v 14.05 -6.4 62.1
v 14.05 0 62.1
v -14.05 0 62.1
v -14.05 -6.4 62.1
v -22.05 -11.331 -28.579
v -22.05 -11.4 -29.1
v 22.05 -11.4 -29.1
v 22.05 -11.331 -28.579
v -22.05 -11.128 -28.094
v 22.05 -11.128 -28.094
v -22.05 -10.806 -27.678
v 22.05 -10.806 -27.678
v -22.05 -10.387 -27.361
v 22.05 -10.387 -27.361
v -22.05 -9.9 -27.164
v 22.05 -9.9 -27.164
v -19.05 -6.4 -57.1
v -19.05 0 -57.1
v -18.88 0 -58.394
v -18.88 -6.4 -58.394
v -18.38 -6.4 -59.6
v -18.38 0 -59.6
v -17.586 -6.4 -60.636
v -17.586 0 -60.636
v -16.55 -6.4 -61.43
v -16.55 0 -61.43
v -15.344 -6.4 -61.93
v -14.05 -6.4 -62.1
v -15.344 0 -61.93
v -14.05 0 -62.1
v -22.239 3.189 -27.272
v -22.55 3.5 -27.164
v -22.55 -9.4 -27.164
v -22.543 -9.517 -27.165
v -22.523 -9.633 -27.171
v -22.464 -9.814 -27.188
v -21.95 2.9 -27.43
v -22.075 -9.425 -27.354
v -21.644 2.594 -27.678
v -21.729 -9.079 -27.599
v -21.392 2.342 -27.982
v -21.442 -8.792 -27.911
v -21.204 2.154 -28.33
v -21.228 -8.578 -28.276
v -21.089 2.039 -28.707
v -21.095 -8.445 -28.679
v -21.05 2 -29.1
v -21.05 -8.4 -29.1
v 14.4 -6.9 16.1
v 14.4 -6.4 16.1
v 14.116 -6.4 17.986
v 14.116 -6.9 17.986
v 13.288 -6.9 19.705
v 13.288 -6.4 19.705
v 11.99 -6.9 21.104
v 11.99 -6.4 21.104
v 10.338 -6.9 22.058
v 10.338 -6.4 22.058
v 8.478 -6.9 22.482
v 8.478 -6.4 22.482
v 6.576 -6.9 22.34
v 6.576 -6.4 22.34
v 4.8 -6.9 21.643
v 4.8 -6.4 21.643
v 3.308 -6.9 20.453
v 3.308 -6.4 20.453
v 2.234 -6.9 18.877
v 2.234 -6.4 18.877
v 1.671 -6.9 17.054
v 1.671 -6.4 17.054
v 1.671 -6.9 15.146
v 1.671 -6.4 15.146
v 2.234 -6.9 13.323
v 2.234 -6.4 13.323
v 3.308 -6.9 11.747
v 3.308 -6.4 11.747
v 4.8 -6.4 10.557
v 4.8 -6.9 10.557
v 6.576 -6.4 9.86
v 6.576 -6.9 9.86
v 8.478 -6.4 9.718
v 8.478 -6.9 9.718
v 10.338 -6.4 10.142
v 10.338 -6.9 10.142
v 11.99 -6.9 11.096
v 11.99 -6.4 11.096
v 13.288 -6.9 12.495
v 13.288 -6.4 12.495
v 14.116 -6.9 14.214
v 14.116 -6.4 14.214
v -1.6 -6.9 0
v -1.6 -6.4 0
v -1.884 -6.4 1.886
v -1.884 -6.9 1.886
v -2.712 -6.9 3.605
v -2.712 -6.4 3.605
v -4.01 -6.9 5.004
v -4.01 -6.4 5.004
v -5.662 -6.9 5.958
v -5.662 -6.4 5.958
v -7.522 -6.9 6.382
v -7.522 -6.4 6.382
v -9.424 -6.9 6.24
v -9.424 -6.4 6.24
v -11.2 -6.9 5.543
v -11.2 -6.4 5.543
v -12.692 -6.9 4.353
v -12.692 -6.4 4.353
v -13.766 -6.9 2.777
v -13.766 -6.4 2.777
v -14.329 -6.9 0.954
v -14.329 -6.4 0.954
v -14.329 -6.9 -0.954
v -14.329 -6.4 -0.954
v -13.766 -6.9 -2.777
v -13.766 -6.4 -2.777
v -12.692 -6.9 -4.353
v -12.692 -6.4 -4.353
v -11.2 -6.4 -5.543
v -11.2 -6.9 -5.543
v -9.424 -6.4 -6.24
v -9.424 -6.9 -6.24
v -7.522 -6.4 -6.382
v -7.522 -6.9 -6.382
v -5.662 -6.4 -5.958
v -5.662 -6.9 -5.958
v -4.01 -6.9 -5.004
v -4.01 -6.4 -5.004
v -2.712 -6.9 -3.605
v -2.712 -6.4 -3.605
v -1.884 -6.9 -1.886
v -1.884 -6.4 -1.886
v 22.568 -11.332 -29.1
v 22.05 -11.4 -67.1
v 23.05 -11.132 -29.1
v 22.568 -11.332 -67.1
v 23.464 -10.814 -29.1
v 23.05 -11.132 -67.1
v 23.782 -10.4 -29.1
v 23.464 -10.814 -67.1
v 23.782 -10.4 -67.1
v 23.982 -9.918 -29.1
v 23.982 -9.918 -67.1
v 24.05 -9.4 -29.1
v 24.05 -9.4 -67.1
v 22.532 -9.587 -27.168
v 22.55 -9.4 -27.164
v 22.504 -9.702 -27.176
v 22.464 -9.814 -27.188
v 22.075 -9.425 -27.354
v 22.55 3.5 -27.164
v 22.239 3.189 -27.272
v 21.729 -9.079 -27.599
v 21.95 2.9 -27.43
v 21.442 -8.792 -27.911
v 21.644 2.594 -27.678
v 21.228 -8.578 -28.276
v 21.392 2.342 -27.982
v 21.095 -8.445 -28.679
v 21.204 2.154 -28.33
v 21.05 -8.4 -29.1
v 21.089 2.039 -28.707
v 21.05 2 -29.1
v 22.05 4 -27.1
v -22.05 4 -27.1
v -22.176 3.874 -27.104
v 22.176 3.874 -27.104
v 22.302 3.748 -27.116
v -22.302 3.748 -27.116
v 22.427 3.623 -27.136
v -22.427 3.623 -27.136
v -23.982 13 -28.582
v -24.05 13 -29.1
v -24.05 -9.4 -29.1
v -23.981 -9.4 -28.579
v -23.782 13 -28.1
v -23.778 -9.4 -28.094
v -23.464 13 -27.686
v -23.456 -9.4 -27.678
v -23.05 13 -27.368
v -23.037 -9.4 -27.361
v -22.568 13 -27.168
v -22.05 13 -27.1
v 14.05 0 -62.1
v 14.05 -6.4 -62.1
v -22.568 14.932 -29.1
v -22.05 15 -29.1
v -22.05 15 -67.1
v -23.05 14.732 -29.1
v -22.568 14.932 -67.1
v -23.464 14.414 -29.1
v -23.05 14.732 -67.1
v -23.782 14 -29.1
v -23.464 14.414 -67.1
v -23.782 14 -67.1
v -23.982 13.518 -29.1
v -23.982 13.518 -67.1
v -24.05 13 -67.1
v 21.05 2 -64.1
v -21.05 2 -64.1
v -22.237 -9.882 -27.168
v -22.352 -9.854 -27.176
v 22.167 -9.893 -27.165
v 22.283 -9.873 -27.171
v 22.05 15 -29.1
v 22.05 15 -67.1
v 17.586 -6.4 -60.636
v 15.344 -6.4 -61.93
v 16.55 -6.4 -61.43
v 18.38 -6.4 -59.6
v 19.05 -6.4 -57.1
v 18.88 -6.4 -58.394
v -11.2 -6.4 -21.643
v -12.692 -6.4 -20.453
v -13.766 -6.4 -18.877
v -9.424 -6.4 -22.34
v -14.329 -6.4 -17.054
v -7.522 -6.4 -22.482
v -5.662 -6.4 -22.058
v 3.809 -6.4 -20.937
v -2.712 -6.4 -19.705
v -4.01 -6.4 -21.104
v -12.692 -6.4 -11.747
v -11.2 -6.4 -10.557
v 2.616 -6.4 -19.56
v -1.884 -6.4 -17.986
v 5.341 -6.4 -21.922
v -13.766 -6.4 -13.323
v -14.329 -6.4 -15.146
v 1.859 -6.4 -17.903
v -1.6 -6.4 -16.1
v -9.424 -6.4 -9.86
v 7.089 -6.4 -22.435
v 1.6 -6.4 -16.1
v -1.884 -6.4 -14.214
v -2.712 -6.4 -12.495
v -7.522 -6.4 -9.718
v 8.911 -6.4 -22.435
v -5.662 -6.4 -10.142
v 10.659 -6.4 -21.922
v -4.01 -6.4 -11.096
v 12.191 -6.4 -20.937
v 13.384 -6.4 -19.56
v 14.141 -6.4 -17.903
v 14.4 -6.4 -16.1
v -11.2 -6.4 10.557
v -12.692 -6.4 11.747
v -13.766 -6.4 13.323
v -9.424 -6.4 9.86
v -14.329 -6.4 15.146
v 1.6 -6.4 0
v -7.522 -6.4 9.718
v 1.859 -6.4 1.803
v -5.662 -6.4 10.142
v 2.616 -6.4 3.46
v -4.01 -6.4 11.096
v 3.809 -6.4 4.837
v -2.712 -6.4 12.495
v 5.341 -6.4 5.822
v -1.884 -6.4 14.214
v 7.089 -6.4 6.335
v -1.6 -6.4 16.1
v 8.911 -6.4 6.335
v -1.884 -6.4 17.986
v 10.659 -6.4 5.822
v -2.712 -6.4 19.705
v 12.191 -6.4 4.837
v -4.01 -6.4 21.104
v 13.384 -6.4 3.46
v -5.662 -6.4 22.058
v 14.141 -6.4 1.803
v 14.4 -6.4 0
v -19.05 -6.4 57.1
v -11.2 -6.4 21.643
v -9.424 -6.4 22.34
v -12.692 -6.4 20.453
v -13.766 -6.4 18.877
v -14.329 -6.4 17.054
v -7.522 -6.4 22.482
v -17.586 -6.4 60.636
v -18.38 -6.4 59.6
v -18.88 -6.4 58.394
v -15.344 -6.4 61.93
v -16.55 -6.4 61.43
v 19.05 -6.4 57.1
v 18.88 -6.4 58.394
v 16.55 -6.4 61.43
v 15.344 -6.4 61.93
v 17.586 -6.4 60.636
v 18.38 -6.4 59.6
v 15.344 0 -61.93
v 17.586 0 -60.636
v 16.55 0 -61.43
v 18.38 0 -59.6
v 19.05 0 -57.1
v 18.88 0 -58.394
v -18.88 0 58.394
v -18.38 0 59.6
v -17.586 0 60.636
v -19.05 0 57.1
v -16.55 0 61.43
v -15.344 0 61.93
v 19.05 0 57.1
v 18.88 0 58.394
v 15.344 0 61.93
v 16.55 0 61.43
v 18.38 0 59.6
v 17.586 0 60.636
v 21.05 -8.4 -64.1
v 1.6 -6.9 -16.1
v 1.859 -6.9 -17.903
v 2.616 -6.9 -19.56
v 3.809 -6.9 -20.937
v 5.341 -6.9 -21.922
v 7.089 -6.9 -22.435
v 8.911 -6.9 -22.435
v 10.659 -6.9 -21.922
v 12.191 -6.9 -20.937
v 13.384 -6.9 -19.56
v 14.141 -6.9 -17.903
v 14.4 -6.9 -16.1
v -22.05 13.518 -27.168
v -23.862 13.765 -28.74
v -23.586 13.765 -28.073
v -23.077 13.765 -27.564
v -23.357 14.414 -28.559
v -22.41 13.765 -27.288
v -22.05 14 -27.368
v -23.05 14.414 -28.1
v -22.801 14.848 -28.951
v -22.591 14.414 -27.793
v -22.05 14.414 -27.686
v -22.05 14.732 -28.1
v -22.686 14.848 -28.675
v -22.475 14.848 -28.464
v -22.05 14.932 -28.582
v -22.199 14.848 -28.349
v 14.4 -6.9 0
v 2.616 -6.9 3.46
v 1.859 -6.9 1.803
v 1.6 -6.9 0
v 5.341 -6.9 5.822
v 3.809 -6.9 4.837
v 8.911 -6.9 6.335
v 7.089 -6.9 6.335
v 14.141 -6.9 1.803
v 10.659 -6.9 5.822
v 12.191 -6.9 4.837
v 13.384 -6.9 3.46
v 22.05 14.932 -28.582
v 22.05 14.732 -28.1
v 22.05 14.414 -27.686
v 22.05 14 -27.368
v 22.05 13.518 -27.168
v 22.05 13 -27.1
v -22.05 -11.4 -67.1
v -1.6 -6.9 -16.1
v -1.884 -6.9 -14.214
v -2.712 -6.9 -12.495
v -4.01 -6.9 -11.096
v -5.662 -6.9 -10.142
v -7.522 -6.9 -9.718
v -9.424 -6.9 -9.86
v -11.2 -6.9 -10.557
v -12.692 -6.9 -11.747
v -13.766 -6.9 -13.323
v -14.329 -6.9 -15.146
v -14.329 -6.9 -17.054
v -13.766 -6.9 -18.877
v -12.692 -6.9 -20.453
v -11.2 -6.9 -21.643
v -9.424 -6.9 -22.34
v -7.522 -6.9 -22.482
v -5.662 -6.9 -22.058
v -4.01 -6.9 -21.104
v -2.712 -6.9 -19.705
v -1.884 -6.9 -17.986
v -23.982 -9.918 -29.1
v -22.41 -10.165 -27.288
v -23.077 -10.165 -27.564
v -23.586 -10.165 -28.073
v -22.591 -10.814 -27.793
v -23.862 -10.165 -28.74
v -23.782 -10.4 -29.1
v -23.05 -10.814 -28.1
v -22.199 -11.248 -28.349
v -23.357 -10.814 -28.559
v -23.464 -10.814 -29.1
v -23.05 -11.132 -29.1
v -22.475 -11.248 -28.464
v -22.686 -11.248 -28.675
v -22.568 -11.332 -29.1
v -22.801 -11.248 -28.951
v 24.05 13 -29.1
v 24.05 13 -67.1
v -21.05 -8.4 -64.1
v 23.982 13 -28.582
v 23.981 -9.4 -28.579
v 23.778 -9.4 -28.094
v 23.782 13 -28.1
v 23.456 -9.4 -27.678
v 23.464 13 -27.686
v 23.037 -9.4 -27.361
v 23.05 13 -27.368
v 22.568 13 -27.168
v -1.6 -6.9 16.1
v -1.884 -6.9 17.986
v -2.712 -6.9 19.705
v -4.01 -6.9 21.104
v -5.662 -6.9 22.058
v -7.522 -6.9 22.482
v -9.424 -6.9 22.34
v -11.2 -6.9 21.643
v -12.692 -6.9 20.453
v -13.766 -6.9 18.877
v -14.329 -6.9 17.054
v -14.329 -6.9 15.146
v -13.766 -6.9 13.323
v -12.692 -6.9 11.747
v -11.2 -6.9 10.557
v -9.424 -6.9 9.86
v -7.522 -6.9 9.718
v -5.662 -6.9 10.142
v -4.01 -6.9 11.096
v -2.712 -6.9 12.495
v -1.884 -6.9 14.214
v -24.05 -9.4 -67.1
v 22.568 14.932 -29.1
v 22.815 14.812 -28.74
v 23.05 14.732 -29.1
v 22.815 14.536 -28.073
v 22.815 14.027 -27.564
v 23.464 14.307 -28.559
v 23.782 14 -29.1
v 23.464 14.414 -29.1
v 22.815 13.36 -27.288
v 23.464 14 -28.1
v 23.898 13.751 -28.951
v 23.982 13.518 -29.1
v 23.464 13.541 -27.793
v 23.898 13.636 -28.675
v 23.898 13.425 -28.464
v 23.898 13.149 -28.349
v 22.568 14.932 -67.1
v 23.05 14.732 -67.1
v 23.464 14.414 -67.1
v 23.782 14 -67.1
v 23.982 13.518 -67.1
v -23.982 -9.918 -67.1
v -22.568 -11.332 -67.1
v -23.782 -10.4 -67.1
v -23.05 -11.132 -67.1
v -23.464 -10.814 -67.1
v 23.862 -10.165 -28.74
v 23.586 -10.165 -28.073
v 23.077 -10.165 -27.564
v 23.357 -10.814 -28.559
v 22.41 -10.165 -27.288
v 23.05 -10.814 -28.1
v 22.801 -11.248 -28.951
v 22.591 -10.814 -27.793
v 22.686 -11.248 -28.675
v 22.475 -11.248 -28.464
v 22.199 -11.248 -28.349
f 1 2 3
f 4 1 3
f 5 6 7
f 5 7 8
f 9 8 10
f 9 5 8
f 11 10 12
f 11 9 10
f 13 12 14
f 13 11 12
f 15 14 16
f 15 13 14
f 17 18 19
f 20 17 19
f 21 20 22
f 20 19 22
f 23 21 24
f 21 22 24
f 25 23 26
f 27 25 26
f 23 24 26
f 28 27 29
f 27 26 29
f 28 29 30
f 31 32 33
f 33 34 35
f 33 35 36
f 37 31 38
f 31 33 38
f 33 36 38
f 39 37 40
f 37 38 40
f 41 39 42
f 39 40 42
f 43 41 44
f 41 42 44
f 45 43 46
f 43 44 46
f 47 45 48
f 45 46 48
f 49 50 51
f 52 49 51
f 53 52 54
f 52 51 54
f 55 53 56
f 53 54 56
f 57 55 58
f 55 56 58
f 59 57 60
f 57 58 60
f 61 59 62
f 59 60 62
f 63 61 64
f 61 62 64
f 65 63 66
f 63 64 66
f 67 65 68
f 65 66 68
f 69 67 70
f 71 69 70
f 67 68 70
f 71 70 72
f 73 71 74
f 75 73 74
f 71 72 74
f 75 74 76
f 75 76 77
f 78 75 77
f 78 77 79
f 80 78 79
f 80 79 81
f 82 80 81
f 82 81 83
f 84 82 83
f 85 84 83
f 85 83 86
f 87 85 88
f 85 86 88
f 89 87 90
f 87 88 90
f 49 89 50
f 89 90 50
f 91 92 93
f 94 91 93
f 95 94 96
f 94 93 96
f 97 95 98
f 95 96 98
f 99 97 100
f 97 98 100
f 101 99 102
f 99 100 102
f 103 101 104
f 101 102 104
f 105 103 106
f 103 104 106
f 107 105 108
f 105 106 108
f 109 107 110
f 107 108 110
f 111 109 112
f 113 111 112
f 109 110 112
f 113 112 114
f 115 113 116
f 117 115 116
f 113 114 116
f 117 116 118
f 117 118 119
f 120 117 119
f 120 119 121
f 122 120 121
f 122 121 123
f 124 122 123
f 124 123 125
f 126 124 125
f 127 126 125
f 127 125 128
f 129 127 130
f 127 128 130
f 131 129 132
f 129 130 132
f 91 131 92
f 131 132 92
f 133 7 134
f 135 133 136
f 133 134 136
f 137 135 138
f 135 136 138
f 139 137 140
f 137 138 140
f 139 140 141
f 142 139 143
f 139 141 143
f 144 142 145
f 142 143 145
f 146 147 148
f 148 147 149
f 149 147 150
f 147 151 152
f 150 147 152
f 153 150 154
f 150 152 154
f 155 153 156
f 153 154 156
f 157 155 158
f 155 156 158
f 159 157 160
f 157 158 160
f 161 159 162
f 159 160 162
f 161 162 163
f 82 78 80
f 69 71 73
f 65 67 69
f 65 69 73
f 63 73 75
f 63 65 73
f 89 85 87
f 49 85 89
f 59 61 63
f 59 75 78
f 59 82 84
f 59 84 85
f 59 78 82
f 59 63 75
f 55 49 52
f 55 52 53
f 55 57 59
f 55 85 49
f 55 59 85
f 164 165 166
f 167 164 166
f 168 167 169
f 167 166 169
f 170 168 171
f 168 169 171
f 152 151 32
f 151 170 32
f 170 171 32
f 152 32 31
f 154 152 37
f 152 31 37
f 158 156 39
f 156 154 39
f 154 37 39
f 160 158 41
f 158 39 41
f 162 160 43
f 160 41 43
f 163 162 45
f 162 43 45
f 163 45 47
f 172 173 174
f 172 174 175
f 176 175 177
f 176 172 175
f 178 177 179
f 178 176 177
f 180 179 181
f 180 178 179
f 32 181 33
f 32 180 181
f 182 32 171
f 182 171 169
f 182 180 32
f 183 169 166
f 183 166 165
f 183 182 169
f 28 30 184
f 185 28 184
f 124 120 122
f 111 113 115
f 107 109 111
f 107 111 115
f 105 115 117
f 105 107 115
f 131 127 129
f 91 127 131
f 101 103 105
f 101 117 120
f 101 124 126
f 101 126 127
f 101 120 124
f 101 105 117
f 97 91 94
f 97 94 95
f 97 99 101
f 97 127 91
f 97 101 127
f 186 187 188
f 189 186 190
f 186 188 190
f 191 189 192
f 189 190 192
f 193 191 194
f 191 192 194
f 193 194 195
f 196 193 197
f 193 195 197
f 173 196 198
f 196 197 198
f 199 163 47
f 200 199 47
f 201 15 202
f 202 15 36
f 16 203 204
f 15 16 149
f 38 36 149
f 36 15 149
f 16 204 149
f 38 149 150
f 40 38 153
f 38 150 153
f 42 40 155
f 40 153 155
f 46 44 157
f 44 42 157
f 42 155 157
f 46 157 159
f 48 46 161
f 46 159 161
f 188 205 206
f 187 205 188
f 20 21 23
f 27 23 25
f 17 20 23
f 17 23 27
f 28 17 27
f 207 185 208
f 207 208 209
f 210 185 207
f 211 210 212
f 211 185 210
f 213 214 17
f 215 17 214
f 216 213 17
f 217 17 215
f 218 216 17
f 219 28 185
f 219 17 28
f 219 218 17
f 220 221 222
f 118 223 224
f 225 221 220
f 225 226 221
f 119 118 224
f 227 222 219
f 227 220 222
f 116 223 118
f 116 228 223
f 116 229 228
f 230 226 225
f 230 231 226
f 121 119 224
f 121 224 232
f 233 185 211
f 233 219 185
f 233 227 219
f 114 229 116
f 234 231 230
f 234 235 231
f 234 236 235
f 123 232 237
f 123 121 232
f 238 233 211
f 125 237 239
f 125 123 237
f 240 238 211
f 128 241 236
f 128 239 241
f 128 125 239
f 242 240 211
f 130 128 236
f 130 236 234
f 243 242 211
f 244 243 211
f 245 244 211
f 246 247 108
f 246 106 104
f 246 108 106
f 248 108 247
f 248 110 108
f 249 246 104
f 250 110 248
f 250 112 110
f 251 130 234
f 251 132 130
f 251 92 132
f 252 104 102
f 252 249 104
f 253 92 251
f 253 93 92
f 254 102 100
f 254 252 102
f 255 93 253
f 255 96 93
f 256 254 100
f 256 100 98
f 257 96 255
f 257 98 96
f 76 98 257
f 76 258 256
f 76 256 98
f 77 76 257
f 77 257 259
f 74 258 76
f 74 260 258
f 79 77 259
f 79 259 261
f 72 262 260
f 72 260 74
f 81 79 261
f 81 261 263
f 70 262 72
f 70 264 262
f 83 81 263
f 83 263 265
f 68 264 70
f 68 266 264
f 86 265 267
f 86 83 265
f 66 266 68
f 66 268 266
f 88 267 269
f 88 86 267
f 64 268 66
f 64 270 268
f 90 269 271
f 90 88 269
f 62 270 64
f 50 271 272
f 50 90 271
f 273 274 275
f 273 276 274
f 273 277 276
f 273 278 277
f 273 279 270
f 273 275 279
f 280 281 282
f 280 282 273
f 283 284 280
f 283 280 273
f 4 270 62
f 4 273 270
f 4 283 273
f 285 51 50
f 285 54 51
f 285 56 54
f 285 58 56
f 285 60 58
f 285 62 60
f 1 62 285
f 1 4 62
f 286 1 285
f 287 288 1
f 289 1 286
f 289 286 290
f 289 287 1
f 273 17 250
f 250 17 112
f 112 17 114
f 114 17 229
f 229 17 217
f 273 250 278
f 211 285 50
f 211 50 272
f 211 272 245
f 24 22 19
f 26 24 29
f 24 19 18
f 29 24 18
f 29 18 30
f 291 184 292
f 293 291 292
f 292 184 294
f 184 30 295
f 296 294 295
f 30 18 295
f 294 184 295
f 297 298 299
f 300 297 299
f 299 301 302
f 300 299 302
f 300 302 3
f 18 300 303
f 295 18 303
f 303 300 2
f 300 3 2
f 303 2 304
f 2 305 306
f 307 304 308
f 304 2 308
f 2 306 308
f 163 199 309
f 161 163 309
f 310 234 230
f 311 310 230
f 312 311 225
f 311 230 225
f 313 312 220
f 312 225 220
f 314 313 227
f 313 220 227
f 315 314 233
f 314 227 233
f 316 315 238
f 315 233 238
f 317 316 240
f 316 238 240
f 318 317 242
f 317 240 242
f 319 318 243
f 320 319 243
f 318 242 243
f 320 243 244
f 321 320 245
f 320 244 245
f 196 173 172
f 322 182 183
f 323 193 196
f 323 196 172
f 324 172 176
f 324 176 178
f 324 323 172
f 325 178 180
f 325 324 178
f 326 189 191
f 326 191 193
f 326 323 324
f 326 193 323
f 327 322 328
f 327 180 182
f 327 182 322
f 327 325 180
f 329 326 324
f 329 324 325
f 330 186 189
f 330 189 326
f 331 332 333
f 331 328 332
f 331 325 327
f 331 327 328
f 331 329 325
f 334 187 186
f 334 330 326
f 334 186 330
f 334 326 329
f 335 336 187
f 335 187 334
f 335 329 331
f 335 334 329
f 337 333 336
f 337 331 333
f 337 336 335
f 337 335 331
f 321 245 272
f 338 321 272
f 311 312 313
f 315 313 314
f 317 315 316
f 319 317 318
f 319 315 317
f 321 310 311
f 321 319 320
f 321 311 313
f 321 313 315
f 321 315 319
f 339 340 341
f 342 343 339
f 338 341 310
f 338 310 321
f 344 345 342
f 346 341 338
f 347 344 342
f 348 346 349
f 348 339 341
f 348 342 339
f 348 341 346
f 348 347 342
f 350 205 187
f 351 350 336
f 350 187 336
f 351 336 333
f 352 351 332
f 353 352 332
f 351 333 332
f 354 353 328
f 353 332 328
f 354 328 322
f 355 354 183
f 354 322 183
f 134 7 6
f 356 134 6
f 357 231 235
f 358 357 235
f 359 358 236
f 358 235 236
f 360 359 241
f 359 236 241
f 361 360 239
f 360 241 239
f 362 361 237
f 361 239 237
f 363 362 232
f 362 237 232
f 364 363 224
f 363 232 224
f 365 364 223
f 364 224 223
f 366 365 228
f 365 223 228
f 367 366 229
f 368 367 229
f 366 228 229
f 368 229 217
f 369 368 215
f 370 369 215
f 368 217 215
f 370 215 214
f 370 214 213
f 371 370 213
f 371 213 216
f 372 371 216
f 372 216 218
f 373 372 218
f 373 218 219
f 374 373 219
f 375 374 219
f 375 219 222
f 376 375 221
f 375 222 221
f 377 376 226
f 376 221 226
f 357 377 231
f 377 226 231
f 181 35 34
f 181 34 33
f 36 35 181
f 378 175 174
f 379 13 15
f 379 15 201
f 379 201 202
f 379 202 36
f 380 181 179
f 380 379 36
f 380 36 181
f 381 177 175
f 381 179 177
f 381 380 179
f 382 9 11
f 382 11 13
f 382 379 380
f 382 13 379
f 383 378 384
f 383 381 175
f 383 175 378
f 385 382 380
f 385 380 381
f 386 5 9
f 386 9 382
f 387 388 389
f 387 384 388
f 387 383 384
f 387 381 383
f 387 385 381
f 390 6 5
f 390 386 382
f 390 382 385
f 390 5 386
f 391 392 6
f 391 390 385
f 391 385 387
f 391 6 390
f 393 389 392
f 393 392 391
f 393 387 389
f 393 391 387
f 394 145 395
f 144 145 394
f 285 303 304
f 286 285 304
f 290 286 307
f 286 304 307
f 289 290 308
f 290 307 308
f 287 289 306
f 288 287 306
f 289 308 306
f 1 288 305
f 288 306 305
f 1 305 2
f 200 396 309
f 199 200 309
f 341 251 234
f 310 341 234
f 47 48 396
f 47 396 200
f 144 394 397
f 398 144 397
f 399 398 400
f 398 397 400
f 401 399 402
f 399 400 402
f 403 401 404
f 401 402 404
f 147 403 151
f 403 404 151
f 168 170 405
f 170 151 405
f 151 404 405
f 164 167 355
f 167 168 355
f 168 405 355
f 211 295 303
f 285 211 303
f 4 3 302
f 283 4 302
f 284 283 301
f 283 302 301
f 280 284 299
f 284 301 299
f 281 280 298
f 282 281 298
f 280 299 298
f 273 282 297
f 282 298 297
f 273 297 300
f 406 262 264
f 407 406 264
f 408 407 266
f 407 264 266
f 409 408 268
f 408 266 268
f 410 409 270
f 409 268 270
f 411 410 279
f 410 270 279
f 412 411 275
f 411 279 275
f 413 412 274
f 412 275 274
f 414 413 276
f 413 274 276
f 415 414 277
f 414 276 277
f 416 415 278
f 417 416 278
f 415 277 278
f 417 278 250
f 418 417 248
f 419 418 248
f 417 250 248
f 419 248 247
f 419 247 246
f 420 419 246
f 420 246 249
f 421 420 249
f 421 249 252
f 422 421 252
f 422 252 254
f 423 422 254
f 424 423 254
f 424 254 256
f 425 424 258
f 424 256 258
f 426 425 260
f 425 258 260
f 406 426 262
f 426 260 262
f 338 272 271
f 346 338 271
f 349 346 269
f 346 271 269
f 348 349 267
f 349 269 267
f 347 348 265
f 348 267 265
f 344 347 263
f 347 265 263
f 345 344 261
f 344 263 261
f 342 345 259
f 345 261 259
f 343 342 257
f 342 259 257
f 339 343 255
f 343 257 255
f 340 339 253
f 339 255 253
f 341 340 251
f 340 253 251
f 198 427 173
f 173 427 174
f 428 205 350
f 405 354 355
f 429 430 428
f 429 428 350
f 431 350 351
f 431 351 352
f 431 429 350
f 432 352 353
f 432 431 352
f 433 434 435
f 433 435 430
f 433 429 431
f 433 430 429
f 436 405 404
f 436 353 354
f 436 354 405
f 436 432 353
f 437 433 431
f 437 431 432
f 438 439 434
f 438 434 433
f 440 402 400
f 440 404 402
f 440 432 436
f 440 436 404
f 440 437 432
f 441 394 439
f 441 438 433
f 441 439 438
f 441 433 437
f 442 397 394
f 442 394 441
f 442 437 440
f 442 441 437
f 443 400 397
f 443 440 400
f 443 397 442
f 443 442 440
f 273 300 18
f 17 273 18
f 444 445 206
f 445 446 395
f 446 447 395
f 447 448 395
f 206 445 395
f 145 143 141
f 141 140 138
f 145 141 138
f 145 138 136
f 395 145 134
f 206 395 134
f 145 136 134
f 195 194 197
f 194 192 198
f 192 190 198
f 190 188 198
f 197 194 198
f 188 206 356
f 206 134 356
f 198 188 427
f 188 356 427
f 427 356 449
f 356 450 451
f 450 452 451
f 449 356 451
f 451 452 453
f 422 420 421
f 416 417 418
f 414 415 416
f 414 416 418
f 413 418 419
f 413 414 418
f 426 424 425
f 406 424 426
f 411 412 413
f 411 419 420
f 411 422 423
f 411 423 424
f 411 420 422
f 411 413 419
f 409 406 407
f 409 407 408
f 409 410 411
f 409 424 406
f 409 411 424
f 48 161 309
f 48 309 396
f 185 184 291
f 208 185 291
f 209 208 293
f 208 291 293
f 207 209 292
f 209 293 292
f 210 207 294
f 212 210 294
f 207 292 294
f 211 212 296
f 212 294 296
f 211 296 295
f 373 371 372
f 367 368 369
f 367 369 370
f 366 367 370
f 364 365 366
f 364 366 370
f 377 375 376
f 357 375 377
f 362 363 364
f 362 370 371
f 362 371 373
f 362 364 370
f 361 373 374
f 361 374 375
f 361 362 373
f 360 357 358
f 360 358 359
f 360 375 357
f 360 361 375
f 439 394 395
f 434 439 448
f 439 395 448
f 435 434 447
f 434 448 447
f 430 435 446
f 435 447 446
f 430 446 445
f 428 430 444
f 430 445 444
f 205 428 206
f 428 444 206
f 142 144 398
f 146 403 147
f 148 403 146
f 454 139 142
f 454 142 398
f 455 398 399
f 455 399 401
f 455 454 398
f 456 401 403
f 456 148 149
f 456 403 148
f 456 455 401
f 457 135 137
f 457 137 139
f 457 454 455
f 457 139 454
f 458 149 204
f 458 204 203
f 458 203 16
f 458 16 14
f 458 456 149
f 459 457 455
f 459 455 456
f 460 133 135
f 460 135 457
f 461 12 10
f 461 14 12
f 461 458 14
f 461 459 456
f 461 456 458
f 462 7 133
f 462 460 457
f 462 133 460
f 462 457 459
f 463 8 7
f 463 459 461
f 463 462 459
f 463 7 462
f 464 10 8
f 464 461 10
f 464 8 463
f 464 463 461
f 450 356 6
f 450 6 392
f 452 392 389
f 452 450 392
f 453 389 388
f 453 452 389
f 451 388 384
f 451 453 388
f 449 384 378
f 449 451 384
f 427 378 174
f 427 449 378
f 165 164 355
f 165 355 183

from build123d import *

# Parameters (mm, degrees)
F1_DEPTH      = 6.4
F2_R          = 6.4
F3_DEPTH      = 0.5
F5_DEPTH      = 35
F5_DEPTH_BACK = 5
F6_T          = -3
F7_W          = 48.1
F7_H          = 40
F8_DEPTH      = 10
F9_T1_DEPTH   = 22.4
F9_T3_DEPTH   = 44.1
F9_T5_DEPTH   = 10.4
F9_T7_DEPTH   = 42.1
F9_T9_DEPTH   = 43
F9_S13_W      = 2
F9_S13_H      = 2
F9_T14_DEPTH  = 2
F9_S19_W      = 2
F9_S19_H      = 2
F9_T20_DEPTH  = 2
F9_S25_W      = 2
F9_S25_H      = 2
F9_T26_DEPTH  = 2
F9_S31_W      = 2
F9_S31_H      = 2
F9_T32_DEPTH  = 2
F9_T39_DEPTH  = 15.4
F9_T43_DEPTH  = 47.1
F9_T50_DEPTH  = 15.4
F9_T54_DEPTH  = 47.1
F9_T61_DEPTH  = 47.1
F9_T65_DEPTH  = 15.4
F9_T72_DEPTH  = 15.4
F9_T76_DEPTH  = 47.1


# Not quite as in the source:
# - a fillet or chamfer that OpenCascade refuses, or shapes differently, is made with other operations: its cross-section is extruded or revolved along the edge and cut away or added


with BuildPart() as f1:
    # F0 (on Front) → F1 (new body)
    with BuildSketch(Plane.XZ):
        with BuildLine():
            ThreePointArc((19.05, 57.1), (17.5855339059, 60.6355339059), (14.05, 62.1))
            Line((14.05, 62.1), (-14.05, 62.1))
            ThreePointArc((-14.05, 62.1), (-17.5855339059, 60.6355339059), (-19.05, 57.1))
            Line((-19.05, 57.1), (-19.05, -57.1))
            ThreePointArc((-19.05, -57.1), (-17.5855339059, -60.6355339059), (-14.05, -62.1))
            Line((-14.05, -62.1), (14.05, -62.1))
            ThreePointArc((14.05, -62.1), (17.5855339059, -60.6355339059), (19.05, -57.1))
            Line((19.05, -57.1), (19.05, 57.1))
        make_face()
    extrude(amount=F1_DEPTH)

    # F2 (on face) → F3 (join)
    with BuildSketch(Plane.XZ.offset(6.4)):
        with BuildLine():
            ThreePointArc((1.6, 0), (8, -6.4), (14.4, 0))
            ThreePointArc((14.4, 0), (8, 6.4), (1.6, 0))
        make_face()
        with BuildLine():
            Line((14.4, -16.1), (14.4, 0))
            ThreePointArc((14.4, 0), (8, -6.4), (1.6, 0))
            Line((1.6, 0), (1.6, -16.1))
            ThreePointArc((1.6, -16.1), (8, -9.7), (14.4, -16.1))
        make_face()
        with BuildLine():
            ThreePointArc((1.6, -16.1), (8, -22.5), (14.4, -16.1))
            ThreePointArc((14.4, -16.1), (8, -9.7), (1.6, -16.1))
        make_face()
        with Locations((8, 16.1)):
            Circle(F2_R)
        with Locations((-8, 16.1)):
            Circle(F2_R)
        with Locations((-8, 0)):
            Circle(F2_R)
        with Locations((-8, -16.1)):
            Circle(F2_R)
    extrude(amount=F3_DEPTH)


with BuildPart() as f5:
    # F4 (on face) → F5 (new body, two sides)
    with BuildSketch(Plane(origin=(0, 0, -62.1), x_dir=(1, 0, 0), z_dir=(0, 0, -1))) as f5_sk:
        Polygon((-14.05, 11.4), (-24.05, 11.4), (-24.05, -5), (-14.05, -5), (14.05, -5), (24.05, -5), (24.05, 11.4), (14.05, 11.4), align=None)
    extrude(amount=-F5_DEPTH)
    extrude(f5_sk.sketch, amount=F5_DEPTH_BACK)

    # F6
    f6_openings = [f5.faces().sort_by_distance(p)[0] for p in [
        (0, -3.2, -27.1),
    ]]
    offset(amount=F6_T, openings=f6_openings)

    # F7 (on face) → F8 (join)
    with BuildSketch(Plane(origin=(0, 5, 0), x_dir=(-1, 0, 0), z_dir=(0, 1, 0))):
        with Locations((0, -47.1)):
            Rectangle(F7_W, F7_H)
    extrude(amount=F8_DEPTH)

    # F9: fillet of radius 2 on 12 edges, made by hand

    # F9_s2 → F9_t1 (cut)
    with BuildSketch(Plane.XZ.offset(-13)):
        with BuildLine():
            ThreePointArc((-24.05, -29.1), (-23.4642135624, -27.6857864376), (-22.05, -27.1))
            Line((-22.05, -27.1), (-24.05, -27.1))
            Line((-24.05, -27.1), (-24.05, -29.1))
        make_face()
        with BuildLine():
            ThreePointArc((24.05, -29.1), (23.4642135624, -27.6857864376), (22.05, -27.1))
            Line((22.05, -27.1), (24.05, -27.1))
            Line((24.05, -27.1), (24.05, -29.1))
        make_face()
    extrude(amount=F9_T1_DEPTH, mode=Mode.SUBTRACT)

    # F9_s4 → F9_t3 (cut)
    with BuildSketch(Plane.YZ.offset(-22.05)):
        with BuildLine():
            ThreePointArc((15, -29.1), (14.4142135624, -27.6857864376), (13, -27.1))
            Line((13, -27.1), (15, -27.1))
            Line((15, -27.1), (15, -29.1))
        make_face()
        with BuildLine():
            ThreePointArc((-11.4, -29.1), (-10.8142135624, -27.6857864376), (-9.4, -27.1))
            Line((-9.4, -27.1), (-11.4, -27.1))
            Line((-11.4, -27.1), (-11.4, -29.1))
        make_face()
    extrude(amount=F9_T3_DEPTH, mode=Mode.SUBTRACT)

    # F9_s6 → F9_t5 (cut)
    with BuildSketch(Plane.XZ.offset(-2)):
        with BuildLine():
            ThreePointArc((-23.05, -27.1), (-21.6357864376, -27.6857864376), (-21.05, -29.1))
            Line((-21.05, -29.1), (-21.05, -27.1))
            Line((-21.05, -27.1), (-23.05, -27.1))
        make_face()
        with BuildLine():
            ThreePointArc((23.05, -27.1), (21.6357864376, -27.6857864376), (21.05, -29.1))
            Line((21.05, -29.1), (21.05, -27.1))
            Line((21.05, -27.1), (23.05, -27.1))
        make_face()
    extrude(amount=F9_T5_DEPTH, mode=Mode.SUBTRACT)

    # F9_s8 → F9_t7 (cut)
    with BuildSketch(Plane.YZ.offset(-21.05)):
        with BuildLine():
            ThreePointArc((-10.4, -27.1), (-8.9857864376, -27.6857864376), (-8.4, -29.1))
            Line((-8.4, -29.1), (-8.4, -27.1))
            Line((-8.4, -27.1), (-10.4, -27.1))
        make_face()
        with BuildLine():
            ThreePointArc((4, -27.1), (2.5857864376, -27.6857864376), (2, -29.1))
            Line((2, -29.1), (2, -27.1))
            Line((2, -27.1), (4, -27.1))
        make_face()
    extrude(amount=F9_T7_DEPTH, mode=Mode.SUBTRACT)

    # F9_s10 → F9_t9 (cut)
    with BuildSketch(Plane.XY.offset(-72.1)):
        with BuildLine():
            ThreePointArc((22.05, -11.4), (23.4642135624, -10.8142135624), (24.05, -9.4))
            Line((24.05, -9.4), (24.05, -11.4))
            Line((24.05, -11.4), (22.05, -11.4))
        make_face()
        with BuildLine():
            ThreePointArc((24.05, 13), (23.4642135624, 14.4142135624), (22.05, 15))
            Line((22.05, 15), (24.05, 15))
            Line((24.05, 15), (24.05, 13))
        make_face()
        with BuildLine():
            ThreePointArc((-22.05, 15), (-23.4642135624, 14.4142135624), (-24.05, 13))
            Line((-24.05, 13), (-24.05, 15))
            Line((-24.05, 15), (-22.05, 15))
        make_face()
        with BuildLine():
            ThreePointArc((-22.05, -11.4), (-23.4642135624, -10.8142135624), (-24.05, -9.4))
            Line((-24.05, -9.4), (-24.05, -11.4))
            Line((-24.05, -11.4), (-22.05, -11.4))
        make_face()
    extrude(amount=F9_T9_DEPTH, mode=Mode.SUBTRACT)


with BuildPart() as f9_tool12:
    # F9_s13 → F9_t14 (new body)
    with BuildSketch(Plane.XZ.offset(-13)):
        with Locations((-23.05, -28.1)):
            Rectangle(F9_S13_W, F9_S13_H)
    extrude(amount=-F9_T14_DEPTH)

    # F9_s15 → F9_t16 (revolve, cut)
    with BuildSketch(Plane(origin=(-22.05, 13, -29.1), x_dir=(0.7071067812, 0, -0.7071067812), z_dir=(0.7071067812, 0, 0.7071067812))):
        with BuildLine():
            ThreePointArc((0, -2), (2, 0), (0, 2))
            Line((0, 2), (0, -2))
        make_face()
    revolve(axis=Axis((-22.05, 13, -29.1), (0, 1, 0)), mode=Mode.SUBTRACT)


with BuildPart() as f5_1:
    add(f5.part)

    # F9_t11: cut F9_tool12
    add(f9_tool12.part, mode=Mode.SUBTRACT)


with BuildPart() as f9_tool18:
    # F9_s19 → F9_t20 (new body)
    with BuildSketch(Plane.XZ.offset(9.4)):
        with Locations((-23.05, -28.1)):
            Rectangle(F9_S19_W, F9_S19_H)
    extrude(amount=F9_T20_DEPTH)

    # F9_s21 → F9_t22 (revolve, cut)
    with BuildSketch(Plane(origin=(-22.05, -9.4, -29.1), x_dir=(0.7071067812, 0, -0.7071067812), z_dir=(-0.7071067812, 0, -0.7071067812))):
        with BuildLine():
            ThreePointArc((0, -2), (2, 0), (0, 2))
            Line((0, 2), (0, -2))
        make_face()
    revolve(axis=Axis((-22.05, -9.4, -29.1), (0, -1, 0)), mode=Mode.SUBTRACT)


with BuildPart() as f5_2:
    add(f5_1.part)

    # F9_t17: cut F9_tool18
    add(f9_tool18.part, mode=Mode.SUBTRACT)


with BuildPart() as f9_tool24:
    # F9_s25 → F9_t26 (new body)
    with BuildSketch(Plane.YZ.offset(22.05)):
        with Locations((14, -28.1)):
            Rectangle(F9_S25_W, F9_S25_H)
    extrude(amount=F9_T26_DEPTH)

    # F9_s27 → F9_t28 (revolve, cut)
    with BuildSketch(Plane(origin=(22.05, 13, -29.1), x_dir=(0, -0.7071067812, -0.7071067812), z_dir=(0, -0.7071067812, 0.7071067812))):
        with BuildLine():
            ThreePointArc((0, -2), (2, 0), (0, 2))
            Line((0, 2), (0, -2))
        make_face()
    revolve(axis=Axis((22.05, 13, -29.1), (1, 0, 0)), mode=Mode.SUBTRACT)


with BuildPart() as f5_3:
    add(f5_2.part)

    # F9_t23: cut F9_tool24
    add(f9_tool24.part, mode=Mode.SUBTRACT)


with BuildPart() as f9_tool30:
    # F9_s31 → F9_t32 (new body)
    with BuildSketch(Plane.XZ.offset(9.4)):
        with Locations((23.05, -28.1)):
            Rectangle(F9_S31_W, F9_S31_H)
    extrude(amount=F9_T32_DEPTH)

    # F9_s33 → F9_t34 (revolve, cut)
    with BuildSketch(Plane(origin=(22.05, -9.4, -29.1), x_dir=(-0.7071067812, 0, -0.7071067812), z_dir=(-0.7071067812, 0, 0.7071067812))):
        with BuildLine():
            ThreePointArc((0, -2), (2, 0), (0, 2))
            Line((0, 2), (0, -2))
        make_face()
    revolve(axis=Axis((22.05, -9.4, -29.1), (0, -1, 0)), mode=Mode.SUBTRACT)


with BuildPart() as f5_4:
    add(f5_3.part)

    # F9_t29: cut F9_tool30
    add(f9_tool30.part, mode=Mode.SUBTRACT)


with BuildPart() as f9_tool37:
    # F9_s38 → F9_t39 (new body)
    with BuildSketch(Plane.XZ.offset(13.4)):
        with BuildLine():
            ThreePointArc((-23.05, -27.1), (-21.6357864376, -27.6857864376), (-21.05, -29.1))
            Line((-21.05, -29.1), (-21.05, -27.1))
            Line((-21.05, -27.1), (-23.05, -27.1))
        make_face()
    extrude(amount=-F9_T39_DEPTH)

    split(bisect_by=Plane.XZ.offset(8.4), keep=Keep.TOP)


with BuildPart() as f9_tool41:
    # F9_s42 → F9_t43 (new body)
    with BuildSketch(Plane.YZ.offset(21.05)):
        with BuildLine():
            ThreePointArc((-10.4, -27.1), (-8.9857864376, -27.6857864376), (-8.4, -29.1))
            Line((-8.4, -29.1), (-8.4, -27.1))
            Line((-8.4, -27.1), (-10.4, -27.1))
        make_face()
    extrude(amount=-F9_T43_DEPTH)

    split(bisect_by=Plane.YZ.offset(-21.05), keep=Keep.BOTTOM)


with BuildPart() as f9_tool37_1:
    add(f9_tool37.part)

    # F9_t45: intersect F9_tool41
    add(f9_tool41.part, mode=Mode.INTERSECT)


with BuildPart() as f5_5:
    add(f5_4.part)

    # F9_t35: cut F9_tool37
    add(f9_tool37_1.part, mode=Mode.SUBTRACT)


with BuildPart() as f9_tool48:
    # F9_s49 → F9_t50 (new body)
    with BuildSketch(Plane.XZ.offset(8.4)):
        with BuildLine():
            ThreePointArc((-23.05, -27.1), (-21.6357864376, -27.6857864376), (-21.05, -29.1))
            Line((-21.05, -29.1), (-21.05, -27.1))
            Line((-21.05, -27.1), (-23.05, -27.1))
        make_face()
    extrude(amount=-F9_T50_DEPTH)

    split(bisect_by=Plane.XZ.offset(-2), keep=Keep.BOTTOM)


with BuildPart() as f9_tool52:
    # F9_s53 → F9_t54 (new body)
    with BuildSketch(Plane.YZ.offset(-26.05)):
        with BuildLine():
            ThreePointArc((4, -27.1), (2.5857864376, -27.6857864376), (2, -29.1))
            Line((2, -29.1), (2, -27.1))
            Line((2, -27.1), (4, -27.1))
        make_face()
    extrude(amount=F9_T54_DEPTH)

    split(bisect_by=Plane.YZ.offset(-21.05), keep=Keep.BOTTOM)


with BuildPart() as f9_tool48_1:
    add(f9_tool48.part)

    # F9_t56: intersect F9_tool52
    add(f9_tool52.part, mode=Mode.INTERSECT)


with BuildPart() as f5_6:
    add(f5_5.part)

    # F9_t46: cut F9_tool48
    add(f9_tool48_1.part, mode=Mode.SUBTRACT)


with BuildPart() as f9_tool59:
    # F9_s60 → F9_t61 (new body)
    with BuildSketch(Plane.YZ.offset(26.05)):
        with BuildLine():
            ThreePointArc((-10.4, -27.1), (-8.9857864376, -27.6857864376), (-8.4, -29.1))
            Line((-8.4, -29.1), (-8.4, -27.1))
            Line((-8.4, -27.1), (-10.4, -27.1))
        make_face()
    extrude(amount=-F9_T61_DEPTH)

    split(bisect_by=Plane.YZ.offset(21.05), keep=Keep.TOP)


with BuildPart() as f9_tool63:
    # F9_s64 → F9_t65 (new body)
    with BuildSketch(Plane.XZ.offset(-2)):
        with BuildLine():
            ThreePointArc((23.05, -27.1), (21.6357864376, -27.6857864376), (21.05, -29.1))
            Line((21.05, -29.1), (21.05, -27.1))
            Line((21.05, -27.1), (23.05, -27.1))
        make_face()
    extrude(amount=F9_T65_DEPTH)

    split(bisect_by=Plane.XZ.offset(8.4), keep=Keep.TOP)


with BuildPart() as f9_tool59_1:
    add(f9_tool59.part)

    # F9_t67: intersect F9_tool63
    add(f9_tool63.part, mode=Mode.INTERSECT)


with BuildPart() as f5_7:
    add(f5_6.part)

    # F9_t57: cut F9_tool59
    add(f9_tool59_1.part, mode=Mode.SUBTRACT)


with BuildPart() as f9_tool70:
    # F9_s71 → F9_t72 (new body)
    with BuildSketch(Plane.XZ.offset(-7)):
        with BuildLine():
            ThreePointArc((23.05, -27.1), (21.6357864376, -27.6857864376), (21.05, -29.1))
            Line((21.05, -29.1), (21.05, -27.1))
            Line((21.05, -27.1), (23.05, -27.1))
        make_face()
    extrude(amount=F9_T72_DEPTH)

    split(bisect_by=Plane.XZ.offset(-2), keep=Keep.BOTTOM)


with BuildPart() as f9_tool74:
    # F9_s75 → F9_t76 (new body)
    with BuildSketch(Plane.YZ.offset(-21.05)):
        with BuildLine():
            ThreePointArc((4, -27.1), (2.5857864376, -27.6857864376), (2, -29.1))
            Line((2, -29.1), (2, -27.1))
            Line((2, -27.1), (4, -27.1))
        make_face()
    extrude(amount=F9_T76_DEPTH)

    split(bisect_by=Plane.YZ.offset(21.05), keep=Keep.TOP)


with BuildPart() as f9_tool70_1:
    add(f9_tool70.part)

    # F9_t78: intersect F9_tool74
    add(f9_tool74.part, mode=Mode.INTERSECT)


with BuildPart() as f5_8:
    add(f5_7.part)

    # F9_t68: cut F9_tool70
    add(f9_tool70_1.part, mode=Mode.SUBTRACT)


solid = Compound([f1.part, f5_8.part])
